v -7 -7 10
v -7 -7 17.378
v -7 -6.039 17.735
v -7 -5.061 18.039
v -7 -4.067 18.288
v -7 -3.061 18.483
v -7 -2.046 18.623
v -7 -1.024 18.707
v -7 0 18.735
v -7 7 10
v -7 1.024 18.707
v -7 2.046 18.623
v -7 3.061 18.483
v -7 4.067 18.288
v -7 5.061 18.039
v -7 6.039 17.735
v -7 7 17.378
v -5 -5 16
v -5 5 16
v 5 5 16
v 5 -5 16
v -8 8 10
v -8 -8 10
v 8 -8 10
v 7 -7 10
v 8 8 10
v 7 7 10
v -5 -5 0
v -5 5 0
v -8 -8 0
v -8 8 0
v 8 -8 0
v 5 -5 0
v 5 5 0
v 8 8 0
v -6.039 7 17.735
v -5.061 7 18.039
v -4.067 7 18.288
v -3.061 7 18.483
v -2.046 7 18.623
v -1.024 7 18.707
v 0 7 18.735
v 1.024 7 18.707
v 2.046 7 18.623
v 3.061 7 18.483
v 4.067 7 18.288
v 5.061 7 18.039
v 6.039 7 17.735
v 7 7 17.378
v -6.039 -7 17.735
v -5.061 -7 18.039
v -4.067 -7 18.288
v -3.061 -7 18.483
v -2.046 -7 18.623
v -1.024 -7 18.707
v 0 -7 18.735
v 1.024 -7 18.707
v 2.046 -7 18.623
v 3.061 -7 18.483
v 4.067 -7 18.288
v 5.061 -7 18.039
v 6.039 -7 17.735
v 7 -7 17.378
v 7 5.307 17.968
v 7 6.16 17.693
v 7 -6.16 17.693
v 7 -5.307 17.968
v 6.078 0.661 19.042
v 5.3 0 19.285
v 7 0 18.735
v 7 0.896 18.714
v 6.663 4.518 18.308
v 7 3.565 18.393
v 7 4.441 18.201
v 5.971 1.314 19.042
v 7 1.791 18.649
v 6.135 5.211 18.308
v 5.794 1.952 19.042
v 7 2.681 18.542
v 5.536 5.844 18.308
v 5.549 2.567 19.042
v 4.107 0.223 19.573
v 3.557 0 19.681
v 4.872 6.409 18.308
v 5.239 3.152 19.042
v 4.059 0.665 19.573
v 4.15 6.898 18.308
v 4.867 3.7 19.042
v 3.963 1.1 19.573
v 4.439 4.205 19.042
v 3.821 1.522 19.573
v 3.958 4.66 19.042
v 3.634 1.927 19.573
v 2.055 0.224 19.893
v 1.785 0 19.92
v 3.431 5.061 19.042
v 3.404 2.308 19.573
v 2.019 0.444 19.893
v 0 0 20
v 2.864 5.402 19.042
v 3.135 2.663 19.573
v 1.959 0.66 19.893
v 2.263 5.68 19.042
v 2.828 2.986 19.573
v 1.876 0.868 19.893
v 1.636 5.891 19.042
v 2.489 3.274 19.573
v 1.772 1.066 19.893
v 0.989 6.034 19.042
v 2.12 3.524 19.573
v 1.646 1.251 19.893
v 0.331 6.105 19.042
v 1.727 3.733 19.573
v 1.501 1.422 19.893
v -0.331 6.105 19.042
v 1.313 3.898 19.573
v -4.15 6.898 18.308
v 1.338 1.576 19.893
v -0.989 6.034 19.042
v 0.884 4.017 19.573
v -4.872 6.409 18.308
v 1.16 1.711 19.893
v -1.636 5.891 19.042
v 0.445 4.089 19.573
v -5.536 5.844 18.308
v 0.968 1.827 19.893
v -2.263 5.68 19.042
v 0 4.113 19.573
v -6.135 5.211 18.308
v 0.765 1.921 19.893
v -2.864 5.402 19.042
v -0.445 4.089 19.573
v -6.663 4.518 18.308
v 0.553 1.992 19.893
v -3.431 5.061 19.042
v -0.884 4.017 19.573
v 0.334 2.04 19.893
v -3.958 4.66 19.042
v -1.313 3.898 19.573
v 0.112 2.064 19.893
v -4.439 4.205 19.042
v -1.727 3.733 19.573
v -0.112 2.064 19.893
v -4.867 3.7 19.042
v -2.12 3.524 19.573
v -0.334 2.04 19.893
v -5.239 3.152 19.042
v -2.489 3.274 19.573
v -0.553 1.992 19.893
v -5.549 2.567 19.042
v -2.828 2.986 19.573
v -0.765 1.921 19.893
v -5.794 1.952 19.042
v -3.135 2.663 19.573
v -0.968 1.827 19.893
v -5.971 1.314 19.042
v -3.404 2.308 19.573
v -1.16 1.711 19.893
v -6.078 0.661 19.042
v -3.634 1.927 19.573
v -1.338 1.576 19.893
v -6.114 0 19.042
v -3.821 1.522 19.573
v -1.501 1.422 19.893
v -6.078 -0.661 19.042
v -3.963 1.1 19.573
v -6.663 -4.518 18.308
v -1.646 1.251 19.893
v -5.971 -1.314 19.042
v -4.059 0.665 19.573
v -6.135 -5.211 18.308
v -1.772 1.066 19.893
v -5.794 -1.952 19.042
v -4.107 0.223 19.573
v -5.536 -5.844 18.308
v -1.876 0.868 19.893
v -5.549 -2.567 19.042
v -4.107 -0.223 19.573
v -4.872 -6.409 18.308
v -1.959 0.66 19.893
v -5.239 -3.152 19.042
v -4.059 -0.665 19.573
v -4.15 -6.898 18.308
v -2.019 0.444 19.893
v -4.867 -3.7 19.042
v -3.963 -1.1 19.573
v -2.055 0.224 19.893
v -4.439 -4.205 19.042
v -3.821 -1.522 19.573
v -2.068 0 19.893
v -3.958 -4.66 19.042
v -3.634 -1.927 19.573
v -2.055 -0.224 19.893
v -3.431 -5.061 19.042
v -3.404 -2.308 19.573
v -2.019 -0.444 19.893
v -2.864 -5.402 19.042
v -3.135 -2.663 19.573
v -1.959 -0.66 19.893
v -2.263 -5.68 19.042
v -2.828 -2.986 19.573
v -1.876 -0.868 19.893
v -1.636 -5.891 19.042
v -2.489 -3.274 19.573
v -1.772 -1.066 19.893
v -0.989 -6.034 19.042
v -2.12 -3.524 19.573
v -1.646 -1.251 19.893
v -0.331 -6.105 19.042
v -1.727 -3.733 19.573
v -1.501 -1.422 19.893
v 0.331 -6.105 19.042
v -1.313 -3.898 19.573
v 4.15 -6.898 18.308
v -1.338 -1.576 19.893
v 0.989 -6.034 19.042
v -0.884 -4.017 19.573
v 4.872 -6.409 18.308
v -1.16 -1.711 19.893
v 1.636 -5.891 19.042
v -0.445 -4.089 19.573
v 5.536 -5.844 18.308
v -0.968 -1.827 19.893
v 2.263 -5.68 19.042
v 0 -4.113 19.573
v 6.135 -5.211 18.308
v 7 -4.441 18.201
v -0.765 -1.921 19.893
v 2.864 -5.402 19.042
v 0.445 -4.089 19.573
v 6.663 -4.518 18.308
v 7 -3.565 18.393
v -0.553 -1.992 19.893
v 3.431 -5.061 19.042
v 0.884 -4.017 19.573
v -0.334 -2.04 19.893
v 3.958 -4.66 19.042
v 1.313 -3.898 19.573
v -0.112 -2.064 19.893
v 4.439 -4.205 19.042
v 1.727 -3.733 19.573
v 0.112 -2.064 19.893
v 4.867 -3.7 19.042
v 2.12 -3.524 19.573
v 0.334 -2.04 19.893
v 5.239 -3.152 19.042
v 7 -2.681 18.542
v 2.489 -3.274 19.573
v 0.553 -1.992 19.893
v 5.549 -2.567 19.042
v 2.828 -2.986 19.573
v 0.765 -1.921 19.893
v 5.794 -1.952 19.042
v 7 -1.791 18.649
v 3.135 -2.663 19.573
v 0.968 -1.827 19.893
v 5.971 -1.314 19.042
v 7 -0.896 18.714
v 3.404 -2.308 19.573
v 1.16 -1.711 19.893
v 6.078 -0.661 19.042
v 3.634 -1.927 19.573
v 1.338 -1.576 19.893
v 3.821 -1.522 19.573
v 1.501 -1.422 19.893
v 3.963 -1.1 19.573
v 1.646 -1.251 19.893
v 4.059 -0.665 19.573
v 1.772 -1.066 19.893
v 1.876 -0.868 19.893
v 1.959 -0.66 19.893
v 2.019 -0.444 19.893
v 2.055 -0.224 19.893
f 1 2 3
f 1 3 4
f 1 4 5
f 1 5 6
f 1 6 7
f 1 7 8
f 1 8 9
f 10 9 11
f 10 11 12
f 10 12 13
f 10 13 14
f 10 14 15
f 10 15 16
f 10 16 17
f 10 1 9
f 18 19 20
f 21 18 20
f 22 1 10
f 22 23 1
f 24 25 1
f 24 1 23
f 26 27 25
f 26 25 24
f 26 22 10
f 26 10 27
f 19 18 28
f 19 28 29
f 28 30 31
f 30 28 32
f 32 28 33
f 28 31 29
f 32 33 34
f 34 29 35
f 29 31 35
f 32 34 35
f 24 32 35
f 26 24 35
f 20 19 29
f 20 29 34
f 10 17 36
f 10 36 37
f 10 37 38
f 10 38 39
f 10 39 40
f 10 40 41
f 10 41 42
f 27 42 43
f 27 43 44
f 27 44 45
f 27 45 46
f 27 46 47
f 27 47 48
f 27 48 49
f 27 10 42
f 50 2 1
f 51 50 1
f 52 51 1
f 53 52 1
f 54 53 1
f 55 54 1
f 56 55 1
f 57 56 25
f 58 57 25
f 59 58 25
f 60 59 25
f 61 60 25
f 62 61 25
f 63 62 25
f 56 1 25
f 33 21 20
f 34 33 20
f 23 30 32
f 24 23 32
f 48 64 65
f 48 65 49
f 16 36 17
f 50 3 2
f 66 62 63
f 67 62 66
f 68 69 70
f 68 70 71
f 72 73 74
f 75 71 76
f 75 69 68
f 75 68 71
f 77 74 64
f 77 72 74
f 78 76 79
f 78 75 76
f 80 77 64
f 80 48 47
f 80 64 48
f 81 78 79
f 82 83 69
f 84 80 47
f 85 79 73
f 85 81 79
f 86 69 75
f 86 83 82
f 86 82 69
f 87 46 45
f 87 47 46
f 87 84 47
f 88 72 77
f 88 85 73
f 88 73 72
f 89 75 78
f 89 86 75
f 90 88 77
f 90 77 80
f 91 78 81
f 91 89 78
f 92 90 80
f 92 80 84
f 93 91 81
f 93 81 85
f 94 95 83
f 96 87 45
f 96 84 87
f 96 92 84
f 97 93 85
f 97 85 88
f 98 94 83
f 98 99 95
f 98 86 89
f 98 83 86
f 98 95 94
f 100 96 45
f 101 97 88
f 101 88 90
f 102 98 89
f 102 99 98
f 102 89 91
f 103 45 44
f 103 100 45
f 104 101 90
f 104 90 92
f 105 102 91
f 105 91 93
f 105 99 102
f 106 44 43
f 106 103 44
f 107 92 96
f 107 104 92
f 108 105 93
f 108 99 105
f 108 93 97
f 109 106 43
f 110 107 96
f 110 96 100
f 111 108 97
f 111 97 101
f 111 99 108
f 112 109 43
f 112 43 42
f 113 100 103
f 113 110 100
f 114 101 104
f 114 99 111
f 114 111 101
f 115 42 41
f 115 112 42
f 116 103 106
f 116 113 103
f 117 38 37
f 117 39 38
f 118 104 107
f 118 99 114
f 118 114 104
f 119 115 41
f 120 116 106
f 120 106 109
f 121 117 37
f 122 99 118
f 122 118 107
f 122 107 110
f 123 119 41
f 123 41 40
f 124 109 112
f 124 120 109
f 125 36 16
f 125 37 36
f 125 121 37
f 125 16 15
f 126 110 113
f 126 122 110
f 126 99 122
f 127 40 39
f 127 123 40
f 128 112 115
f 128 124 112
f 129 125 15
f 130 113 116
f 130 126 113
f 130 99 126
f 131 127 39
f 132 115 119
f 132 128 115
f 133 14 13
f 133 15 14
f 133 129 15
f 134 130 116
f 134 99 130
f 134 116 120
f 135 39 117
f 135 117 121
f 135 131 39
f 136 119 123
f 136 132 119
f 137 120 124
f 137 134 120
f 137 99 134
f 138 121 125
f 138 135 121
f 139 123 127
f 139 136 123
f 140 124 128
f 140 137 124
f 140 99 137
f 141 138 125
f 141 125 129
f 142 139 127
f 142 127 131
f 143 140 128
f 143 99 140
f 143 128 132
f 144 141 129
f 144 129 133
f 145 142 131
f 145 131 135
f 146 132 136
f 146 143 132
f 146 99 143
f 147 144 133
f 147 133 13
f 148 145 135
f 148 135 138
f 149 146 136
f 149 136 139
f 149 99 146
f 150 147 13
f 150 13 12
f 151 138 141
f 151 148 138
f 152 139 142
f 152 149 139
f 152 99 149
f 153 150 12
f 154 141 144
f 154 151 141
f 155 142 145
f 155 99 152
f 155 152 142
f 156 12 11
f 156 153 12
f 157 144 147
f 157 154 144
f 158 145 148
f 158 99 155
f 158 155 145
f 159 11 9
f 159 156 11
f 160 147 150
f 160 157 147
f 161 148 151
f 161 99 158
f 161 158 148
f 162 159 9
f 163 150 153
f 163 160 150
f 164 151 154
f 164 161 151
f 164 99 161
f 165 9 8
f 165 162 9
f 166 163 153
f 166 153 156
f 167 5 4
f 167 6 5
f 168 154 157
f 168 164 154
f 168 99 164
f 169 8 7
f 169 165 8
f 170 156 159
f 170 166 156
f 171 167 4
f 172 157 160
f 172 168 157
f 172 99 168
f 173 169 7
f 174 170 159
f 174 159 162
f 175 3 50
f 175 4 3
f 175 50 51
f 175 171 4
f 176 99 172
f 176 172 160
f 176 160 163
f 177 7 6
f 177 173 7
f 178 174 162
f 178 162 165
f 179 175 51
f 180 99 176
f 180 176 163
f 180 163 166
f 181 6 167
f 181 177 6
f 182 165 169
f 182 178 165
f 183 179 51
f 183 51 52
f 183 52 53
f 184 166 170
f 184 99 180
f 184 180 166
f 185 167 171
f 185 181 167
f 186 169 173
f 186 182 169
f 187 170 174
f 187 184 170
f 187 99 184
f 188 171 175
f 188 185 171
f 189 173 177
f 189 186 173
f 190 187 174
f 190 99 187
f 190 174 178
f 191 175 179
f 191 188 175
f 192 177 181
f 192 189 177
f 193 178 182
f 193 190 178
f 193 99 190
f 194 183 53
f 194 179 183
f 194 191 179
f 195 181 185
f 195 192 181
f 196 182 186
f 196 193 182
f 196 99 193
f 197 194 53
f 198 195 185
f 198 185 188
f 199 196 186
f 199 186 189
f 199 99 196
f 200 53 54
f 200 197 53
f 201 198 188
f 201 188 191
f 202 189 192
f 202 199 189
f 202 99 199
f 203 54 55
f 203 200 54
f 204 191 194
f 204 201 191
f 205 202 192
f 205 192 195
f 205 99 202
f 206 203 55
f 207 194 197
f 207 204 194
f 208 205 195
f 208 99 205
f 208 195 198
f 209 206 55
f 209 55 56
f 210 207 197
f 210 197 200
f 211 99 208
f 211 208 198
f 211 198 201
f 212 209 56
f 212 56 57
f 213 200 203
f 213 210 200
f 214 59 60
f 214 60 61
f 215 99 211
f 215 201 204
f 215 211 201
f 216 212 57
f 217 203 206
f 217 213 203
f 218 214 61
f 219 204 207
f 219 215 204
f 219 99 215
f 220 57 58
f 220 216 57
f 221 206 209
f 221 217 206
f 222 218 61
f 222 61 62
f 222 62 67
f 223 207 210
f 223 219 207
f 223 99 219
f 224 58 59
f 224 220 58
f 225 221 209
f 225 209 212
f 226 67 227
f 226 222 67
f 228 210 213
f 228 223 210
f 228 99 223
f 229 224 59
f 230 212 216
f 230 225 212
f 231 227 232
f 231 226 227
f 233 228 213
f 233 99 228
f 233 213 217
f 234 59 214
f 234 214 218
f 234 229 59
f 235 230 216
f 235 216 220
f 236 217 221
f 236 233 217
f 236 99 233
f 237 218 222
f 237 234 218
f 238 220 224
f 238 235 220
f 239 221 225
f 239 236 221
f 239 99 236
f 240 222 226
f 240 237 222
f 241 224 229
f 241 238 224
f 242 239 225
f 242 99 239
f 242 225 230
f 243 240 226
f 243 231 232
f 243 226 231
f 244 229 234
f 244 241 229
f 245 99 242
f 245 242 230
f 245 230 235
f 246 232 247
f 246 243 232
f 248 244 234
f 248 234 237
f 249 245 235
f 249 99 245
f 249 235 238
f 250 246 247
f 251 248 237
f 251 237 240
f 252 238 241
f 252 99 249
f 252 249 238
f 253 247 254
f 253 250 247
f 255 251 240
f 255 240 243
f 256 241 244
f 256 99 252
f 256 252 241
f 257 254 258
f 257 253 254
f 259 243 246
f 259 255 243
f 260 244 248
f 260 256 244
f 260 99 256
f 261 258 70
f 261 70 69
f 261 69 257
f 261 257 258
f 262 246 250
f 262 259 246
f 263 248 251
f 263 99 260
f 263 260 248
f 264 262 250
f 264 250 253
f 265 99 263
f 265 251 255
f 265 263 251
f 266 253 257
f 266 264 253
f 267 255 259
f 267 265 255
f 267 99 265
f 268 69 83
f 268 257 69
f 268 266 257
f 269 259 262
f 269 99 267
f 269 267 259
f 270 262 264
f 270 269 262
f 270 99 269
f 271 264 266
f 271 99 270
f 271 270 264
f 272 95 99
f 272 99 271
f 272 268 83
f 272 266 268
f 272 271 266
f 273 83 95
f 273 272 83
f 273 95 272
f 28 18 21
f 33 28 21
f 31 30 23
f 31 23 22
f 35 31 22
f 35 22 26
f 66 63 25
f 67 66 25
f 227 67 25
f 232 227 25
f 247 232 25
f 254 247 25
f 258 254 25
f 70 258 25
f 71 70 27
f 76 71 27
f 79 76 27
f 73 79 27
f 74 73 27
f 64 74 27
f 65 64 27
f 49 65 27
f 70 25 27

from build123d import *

# Parameters (mm, degrees)
BOX002_W     = 10
BOX002_H     = 10
BOX002_DEPTH = 16
BOX001_W     = 14
BOX001_H     = 14
BOX001_DEPTH = 10
BOX_W        = 16
BOX_H        = 16
BOX_DEPTH    = 10


with BuildPart() as cube001:
    # Box002 → Box002 (new body)
    with BuildSketch(Plane(origin=(-5, -5, 0), x_dir=(1, 0, 0), z_dir=(0, 0, 1))):
        with Locations((5, 5)):
            Rectangle(BOX002_W, BOX002_H)
    extrude(amount=BOX002_DEPTH)


with BuildPart() as cubo:
    # Box001 → Box001 (new body)
    with BuildSketch(Plane(origin=(-7, -7, 10), x_dir=(1, 0, 0), z_dir=(0, 0, 1))):
        with Locations((7, 7)):
            Rectangle(BOX001_W, BOX001_H)
    extrude(amount=BOX001_DEPTH)


with BuildPart() as common:
    # Sphere → Sphere (revolve)
    with BuildSketch(Plane.XZ):
        with BuildLine():
            ThreePointArc((0, -20), (20, 0), (0, 20))
            Line((0, 20), (0, -20))
        make_face()
    revolve(axis=Axis((0, 0, 0), (0, 0, 1)))

    # Common: intersect Cubo
    add(cubo.part, mode=Mode.INTERSECT)


with BuildPart() as cut:
    # Box → Box (new body)
    with BuildSketch(Plane(origin=(-8, -8, 0), x_dir=(1, 0, 0), z_dir=(0, 0, 1))):
        with Locations((8, 8)):
            Rectangle(BOX_W, BOX_H)
    extrude(amount=BOX_DEPTH)

    # Fusion: union Common
    add(common.part)

    # Cut: cut Cube001
    add(cube001.part, mode=Mode.SUBTRACT)


solid = cut.part
